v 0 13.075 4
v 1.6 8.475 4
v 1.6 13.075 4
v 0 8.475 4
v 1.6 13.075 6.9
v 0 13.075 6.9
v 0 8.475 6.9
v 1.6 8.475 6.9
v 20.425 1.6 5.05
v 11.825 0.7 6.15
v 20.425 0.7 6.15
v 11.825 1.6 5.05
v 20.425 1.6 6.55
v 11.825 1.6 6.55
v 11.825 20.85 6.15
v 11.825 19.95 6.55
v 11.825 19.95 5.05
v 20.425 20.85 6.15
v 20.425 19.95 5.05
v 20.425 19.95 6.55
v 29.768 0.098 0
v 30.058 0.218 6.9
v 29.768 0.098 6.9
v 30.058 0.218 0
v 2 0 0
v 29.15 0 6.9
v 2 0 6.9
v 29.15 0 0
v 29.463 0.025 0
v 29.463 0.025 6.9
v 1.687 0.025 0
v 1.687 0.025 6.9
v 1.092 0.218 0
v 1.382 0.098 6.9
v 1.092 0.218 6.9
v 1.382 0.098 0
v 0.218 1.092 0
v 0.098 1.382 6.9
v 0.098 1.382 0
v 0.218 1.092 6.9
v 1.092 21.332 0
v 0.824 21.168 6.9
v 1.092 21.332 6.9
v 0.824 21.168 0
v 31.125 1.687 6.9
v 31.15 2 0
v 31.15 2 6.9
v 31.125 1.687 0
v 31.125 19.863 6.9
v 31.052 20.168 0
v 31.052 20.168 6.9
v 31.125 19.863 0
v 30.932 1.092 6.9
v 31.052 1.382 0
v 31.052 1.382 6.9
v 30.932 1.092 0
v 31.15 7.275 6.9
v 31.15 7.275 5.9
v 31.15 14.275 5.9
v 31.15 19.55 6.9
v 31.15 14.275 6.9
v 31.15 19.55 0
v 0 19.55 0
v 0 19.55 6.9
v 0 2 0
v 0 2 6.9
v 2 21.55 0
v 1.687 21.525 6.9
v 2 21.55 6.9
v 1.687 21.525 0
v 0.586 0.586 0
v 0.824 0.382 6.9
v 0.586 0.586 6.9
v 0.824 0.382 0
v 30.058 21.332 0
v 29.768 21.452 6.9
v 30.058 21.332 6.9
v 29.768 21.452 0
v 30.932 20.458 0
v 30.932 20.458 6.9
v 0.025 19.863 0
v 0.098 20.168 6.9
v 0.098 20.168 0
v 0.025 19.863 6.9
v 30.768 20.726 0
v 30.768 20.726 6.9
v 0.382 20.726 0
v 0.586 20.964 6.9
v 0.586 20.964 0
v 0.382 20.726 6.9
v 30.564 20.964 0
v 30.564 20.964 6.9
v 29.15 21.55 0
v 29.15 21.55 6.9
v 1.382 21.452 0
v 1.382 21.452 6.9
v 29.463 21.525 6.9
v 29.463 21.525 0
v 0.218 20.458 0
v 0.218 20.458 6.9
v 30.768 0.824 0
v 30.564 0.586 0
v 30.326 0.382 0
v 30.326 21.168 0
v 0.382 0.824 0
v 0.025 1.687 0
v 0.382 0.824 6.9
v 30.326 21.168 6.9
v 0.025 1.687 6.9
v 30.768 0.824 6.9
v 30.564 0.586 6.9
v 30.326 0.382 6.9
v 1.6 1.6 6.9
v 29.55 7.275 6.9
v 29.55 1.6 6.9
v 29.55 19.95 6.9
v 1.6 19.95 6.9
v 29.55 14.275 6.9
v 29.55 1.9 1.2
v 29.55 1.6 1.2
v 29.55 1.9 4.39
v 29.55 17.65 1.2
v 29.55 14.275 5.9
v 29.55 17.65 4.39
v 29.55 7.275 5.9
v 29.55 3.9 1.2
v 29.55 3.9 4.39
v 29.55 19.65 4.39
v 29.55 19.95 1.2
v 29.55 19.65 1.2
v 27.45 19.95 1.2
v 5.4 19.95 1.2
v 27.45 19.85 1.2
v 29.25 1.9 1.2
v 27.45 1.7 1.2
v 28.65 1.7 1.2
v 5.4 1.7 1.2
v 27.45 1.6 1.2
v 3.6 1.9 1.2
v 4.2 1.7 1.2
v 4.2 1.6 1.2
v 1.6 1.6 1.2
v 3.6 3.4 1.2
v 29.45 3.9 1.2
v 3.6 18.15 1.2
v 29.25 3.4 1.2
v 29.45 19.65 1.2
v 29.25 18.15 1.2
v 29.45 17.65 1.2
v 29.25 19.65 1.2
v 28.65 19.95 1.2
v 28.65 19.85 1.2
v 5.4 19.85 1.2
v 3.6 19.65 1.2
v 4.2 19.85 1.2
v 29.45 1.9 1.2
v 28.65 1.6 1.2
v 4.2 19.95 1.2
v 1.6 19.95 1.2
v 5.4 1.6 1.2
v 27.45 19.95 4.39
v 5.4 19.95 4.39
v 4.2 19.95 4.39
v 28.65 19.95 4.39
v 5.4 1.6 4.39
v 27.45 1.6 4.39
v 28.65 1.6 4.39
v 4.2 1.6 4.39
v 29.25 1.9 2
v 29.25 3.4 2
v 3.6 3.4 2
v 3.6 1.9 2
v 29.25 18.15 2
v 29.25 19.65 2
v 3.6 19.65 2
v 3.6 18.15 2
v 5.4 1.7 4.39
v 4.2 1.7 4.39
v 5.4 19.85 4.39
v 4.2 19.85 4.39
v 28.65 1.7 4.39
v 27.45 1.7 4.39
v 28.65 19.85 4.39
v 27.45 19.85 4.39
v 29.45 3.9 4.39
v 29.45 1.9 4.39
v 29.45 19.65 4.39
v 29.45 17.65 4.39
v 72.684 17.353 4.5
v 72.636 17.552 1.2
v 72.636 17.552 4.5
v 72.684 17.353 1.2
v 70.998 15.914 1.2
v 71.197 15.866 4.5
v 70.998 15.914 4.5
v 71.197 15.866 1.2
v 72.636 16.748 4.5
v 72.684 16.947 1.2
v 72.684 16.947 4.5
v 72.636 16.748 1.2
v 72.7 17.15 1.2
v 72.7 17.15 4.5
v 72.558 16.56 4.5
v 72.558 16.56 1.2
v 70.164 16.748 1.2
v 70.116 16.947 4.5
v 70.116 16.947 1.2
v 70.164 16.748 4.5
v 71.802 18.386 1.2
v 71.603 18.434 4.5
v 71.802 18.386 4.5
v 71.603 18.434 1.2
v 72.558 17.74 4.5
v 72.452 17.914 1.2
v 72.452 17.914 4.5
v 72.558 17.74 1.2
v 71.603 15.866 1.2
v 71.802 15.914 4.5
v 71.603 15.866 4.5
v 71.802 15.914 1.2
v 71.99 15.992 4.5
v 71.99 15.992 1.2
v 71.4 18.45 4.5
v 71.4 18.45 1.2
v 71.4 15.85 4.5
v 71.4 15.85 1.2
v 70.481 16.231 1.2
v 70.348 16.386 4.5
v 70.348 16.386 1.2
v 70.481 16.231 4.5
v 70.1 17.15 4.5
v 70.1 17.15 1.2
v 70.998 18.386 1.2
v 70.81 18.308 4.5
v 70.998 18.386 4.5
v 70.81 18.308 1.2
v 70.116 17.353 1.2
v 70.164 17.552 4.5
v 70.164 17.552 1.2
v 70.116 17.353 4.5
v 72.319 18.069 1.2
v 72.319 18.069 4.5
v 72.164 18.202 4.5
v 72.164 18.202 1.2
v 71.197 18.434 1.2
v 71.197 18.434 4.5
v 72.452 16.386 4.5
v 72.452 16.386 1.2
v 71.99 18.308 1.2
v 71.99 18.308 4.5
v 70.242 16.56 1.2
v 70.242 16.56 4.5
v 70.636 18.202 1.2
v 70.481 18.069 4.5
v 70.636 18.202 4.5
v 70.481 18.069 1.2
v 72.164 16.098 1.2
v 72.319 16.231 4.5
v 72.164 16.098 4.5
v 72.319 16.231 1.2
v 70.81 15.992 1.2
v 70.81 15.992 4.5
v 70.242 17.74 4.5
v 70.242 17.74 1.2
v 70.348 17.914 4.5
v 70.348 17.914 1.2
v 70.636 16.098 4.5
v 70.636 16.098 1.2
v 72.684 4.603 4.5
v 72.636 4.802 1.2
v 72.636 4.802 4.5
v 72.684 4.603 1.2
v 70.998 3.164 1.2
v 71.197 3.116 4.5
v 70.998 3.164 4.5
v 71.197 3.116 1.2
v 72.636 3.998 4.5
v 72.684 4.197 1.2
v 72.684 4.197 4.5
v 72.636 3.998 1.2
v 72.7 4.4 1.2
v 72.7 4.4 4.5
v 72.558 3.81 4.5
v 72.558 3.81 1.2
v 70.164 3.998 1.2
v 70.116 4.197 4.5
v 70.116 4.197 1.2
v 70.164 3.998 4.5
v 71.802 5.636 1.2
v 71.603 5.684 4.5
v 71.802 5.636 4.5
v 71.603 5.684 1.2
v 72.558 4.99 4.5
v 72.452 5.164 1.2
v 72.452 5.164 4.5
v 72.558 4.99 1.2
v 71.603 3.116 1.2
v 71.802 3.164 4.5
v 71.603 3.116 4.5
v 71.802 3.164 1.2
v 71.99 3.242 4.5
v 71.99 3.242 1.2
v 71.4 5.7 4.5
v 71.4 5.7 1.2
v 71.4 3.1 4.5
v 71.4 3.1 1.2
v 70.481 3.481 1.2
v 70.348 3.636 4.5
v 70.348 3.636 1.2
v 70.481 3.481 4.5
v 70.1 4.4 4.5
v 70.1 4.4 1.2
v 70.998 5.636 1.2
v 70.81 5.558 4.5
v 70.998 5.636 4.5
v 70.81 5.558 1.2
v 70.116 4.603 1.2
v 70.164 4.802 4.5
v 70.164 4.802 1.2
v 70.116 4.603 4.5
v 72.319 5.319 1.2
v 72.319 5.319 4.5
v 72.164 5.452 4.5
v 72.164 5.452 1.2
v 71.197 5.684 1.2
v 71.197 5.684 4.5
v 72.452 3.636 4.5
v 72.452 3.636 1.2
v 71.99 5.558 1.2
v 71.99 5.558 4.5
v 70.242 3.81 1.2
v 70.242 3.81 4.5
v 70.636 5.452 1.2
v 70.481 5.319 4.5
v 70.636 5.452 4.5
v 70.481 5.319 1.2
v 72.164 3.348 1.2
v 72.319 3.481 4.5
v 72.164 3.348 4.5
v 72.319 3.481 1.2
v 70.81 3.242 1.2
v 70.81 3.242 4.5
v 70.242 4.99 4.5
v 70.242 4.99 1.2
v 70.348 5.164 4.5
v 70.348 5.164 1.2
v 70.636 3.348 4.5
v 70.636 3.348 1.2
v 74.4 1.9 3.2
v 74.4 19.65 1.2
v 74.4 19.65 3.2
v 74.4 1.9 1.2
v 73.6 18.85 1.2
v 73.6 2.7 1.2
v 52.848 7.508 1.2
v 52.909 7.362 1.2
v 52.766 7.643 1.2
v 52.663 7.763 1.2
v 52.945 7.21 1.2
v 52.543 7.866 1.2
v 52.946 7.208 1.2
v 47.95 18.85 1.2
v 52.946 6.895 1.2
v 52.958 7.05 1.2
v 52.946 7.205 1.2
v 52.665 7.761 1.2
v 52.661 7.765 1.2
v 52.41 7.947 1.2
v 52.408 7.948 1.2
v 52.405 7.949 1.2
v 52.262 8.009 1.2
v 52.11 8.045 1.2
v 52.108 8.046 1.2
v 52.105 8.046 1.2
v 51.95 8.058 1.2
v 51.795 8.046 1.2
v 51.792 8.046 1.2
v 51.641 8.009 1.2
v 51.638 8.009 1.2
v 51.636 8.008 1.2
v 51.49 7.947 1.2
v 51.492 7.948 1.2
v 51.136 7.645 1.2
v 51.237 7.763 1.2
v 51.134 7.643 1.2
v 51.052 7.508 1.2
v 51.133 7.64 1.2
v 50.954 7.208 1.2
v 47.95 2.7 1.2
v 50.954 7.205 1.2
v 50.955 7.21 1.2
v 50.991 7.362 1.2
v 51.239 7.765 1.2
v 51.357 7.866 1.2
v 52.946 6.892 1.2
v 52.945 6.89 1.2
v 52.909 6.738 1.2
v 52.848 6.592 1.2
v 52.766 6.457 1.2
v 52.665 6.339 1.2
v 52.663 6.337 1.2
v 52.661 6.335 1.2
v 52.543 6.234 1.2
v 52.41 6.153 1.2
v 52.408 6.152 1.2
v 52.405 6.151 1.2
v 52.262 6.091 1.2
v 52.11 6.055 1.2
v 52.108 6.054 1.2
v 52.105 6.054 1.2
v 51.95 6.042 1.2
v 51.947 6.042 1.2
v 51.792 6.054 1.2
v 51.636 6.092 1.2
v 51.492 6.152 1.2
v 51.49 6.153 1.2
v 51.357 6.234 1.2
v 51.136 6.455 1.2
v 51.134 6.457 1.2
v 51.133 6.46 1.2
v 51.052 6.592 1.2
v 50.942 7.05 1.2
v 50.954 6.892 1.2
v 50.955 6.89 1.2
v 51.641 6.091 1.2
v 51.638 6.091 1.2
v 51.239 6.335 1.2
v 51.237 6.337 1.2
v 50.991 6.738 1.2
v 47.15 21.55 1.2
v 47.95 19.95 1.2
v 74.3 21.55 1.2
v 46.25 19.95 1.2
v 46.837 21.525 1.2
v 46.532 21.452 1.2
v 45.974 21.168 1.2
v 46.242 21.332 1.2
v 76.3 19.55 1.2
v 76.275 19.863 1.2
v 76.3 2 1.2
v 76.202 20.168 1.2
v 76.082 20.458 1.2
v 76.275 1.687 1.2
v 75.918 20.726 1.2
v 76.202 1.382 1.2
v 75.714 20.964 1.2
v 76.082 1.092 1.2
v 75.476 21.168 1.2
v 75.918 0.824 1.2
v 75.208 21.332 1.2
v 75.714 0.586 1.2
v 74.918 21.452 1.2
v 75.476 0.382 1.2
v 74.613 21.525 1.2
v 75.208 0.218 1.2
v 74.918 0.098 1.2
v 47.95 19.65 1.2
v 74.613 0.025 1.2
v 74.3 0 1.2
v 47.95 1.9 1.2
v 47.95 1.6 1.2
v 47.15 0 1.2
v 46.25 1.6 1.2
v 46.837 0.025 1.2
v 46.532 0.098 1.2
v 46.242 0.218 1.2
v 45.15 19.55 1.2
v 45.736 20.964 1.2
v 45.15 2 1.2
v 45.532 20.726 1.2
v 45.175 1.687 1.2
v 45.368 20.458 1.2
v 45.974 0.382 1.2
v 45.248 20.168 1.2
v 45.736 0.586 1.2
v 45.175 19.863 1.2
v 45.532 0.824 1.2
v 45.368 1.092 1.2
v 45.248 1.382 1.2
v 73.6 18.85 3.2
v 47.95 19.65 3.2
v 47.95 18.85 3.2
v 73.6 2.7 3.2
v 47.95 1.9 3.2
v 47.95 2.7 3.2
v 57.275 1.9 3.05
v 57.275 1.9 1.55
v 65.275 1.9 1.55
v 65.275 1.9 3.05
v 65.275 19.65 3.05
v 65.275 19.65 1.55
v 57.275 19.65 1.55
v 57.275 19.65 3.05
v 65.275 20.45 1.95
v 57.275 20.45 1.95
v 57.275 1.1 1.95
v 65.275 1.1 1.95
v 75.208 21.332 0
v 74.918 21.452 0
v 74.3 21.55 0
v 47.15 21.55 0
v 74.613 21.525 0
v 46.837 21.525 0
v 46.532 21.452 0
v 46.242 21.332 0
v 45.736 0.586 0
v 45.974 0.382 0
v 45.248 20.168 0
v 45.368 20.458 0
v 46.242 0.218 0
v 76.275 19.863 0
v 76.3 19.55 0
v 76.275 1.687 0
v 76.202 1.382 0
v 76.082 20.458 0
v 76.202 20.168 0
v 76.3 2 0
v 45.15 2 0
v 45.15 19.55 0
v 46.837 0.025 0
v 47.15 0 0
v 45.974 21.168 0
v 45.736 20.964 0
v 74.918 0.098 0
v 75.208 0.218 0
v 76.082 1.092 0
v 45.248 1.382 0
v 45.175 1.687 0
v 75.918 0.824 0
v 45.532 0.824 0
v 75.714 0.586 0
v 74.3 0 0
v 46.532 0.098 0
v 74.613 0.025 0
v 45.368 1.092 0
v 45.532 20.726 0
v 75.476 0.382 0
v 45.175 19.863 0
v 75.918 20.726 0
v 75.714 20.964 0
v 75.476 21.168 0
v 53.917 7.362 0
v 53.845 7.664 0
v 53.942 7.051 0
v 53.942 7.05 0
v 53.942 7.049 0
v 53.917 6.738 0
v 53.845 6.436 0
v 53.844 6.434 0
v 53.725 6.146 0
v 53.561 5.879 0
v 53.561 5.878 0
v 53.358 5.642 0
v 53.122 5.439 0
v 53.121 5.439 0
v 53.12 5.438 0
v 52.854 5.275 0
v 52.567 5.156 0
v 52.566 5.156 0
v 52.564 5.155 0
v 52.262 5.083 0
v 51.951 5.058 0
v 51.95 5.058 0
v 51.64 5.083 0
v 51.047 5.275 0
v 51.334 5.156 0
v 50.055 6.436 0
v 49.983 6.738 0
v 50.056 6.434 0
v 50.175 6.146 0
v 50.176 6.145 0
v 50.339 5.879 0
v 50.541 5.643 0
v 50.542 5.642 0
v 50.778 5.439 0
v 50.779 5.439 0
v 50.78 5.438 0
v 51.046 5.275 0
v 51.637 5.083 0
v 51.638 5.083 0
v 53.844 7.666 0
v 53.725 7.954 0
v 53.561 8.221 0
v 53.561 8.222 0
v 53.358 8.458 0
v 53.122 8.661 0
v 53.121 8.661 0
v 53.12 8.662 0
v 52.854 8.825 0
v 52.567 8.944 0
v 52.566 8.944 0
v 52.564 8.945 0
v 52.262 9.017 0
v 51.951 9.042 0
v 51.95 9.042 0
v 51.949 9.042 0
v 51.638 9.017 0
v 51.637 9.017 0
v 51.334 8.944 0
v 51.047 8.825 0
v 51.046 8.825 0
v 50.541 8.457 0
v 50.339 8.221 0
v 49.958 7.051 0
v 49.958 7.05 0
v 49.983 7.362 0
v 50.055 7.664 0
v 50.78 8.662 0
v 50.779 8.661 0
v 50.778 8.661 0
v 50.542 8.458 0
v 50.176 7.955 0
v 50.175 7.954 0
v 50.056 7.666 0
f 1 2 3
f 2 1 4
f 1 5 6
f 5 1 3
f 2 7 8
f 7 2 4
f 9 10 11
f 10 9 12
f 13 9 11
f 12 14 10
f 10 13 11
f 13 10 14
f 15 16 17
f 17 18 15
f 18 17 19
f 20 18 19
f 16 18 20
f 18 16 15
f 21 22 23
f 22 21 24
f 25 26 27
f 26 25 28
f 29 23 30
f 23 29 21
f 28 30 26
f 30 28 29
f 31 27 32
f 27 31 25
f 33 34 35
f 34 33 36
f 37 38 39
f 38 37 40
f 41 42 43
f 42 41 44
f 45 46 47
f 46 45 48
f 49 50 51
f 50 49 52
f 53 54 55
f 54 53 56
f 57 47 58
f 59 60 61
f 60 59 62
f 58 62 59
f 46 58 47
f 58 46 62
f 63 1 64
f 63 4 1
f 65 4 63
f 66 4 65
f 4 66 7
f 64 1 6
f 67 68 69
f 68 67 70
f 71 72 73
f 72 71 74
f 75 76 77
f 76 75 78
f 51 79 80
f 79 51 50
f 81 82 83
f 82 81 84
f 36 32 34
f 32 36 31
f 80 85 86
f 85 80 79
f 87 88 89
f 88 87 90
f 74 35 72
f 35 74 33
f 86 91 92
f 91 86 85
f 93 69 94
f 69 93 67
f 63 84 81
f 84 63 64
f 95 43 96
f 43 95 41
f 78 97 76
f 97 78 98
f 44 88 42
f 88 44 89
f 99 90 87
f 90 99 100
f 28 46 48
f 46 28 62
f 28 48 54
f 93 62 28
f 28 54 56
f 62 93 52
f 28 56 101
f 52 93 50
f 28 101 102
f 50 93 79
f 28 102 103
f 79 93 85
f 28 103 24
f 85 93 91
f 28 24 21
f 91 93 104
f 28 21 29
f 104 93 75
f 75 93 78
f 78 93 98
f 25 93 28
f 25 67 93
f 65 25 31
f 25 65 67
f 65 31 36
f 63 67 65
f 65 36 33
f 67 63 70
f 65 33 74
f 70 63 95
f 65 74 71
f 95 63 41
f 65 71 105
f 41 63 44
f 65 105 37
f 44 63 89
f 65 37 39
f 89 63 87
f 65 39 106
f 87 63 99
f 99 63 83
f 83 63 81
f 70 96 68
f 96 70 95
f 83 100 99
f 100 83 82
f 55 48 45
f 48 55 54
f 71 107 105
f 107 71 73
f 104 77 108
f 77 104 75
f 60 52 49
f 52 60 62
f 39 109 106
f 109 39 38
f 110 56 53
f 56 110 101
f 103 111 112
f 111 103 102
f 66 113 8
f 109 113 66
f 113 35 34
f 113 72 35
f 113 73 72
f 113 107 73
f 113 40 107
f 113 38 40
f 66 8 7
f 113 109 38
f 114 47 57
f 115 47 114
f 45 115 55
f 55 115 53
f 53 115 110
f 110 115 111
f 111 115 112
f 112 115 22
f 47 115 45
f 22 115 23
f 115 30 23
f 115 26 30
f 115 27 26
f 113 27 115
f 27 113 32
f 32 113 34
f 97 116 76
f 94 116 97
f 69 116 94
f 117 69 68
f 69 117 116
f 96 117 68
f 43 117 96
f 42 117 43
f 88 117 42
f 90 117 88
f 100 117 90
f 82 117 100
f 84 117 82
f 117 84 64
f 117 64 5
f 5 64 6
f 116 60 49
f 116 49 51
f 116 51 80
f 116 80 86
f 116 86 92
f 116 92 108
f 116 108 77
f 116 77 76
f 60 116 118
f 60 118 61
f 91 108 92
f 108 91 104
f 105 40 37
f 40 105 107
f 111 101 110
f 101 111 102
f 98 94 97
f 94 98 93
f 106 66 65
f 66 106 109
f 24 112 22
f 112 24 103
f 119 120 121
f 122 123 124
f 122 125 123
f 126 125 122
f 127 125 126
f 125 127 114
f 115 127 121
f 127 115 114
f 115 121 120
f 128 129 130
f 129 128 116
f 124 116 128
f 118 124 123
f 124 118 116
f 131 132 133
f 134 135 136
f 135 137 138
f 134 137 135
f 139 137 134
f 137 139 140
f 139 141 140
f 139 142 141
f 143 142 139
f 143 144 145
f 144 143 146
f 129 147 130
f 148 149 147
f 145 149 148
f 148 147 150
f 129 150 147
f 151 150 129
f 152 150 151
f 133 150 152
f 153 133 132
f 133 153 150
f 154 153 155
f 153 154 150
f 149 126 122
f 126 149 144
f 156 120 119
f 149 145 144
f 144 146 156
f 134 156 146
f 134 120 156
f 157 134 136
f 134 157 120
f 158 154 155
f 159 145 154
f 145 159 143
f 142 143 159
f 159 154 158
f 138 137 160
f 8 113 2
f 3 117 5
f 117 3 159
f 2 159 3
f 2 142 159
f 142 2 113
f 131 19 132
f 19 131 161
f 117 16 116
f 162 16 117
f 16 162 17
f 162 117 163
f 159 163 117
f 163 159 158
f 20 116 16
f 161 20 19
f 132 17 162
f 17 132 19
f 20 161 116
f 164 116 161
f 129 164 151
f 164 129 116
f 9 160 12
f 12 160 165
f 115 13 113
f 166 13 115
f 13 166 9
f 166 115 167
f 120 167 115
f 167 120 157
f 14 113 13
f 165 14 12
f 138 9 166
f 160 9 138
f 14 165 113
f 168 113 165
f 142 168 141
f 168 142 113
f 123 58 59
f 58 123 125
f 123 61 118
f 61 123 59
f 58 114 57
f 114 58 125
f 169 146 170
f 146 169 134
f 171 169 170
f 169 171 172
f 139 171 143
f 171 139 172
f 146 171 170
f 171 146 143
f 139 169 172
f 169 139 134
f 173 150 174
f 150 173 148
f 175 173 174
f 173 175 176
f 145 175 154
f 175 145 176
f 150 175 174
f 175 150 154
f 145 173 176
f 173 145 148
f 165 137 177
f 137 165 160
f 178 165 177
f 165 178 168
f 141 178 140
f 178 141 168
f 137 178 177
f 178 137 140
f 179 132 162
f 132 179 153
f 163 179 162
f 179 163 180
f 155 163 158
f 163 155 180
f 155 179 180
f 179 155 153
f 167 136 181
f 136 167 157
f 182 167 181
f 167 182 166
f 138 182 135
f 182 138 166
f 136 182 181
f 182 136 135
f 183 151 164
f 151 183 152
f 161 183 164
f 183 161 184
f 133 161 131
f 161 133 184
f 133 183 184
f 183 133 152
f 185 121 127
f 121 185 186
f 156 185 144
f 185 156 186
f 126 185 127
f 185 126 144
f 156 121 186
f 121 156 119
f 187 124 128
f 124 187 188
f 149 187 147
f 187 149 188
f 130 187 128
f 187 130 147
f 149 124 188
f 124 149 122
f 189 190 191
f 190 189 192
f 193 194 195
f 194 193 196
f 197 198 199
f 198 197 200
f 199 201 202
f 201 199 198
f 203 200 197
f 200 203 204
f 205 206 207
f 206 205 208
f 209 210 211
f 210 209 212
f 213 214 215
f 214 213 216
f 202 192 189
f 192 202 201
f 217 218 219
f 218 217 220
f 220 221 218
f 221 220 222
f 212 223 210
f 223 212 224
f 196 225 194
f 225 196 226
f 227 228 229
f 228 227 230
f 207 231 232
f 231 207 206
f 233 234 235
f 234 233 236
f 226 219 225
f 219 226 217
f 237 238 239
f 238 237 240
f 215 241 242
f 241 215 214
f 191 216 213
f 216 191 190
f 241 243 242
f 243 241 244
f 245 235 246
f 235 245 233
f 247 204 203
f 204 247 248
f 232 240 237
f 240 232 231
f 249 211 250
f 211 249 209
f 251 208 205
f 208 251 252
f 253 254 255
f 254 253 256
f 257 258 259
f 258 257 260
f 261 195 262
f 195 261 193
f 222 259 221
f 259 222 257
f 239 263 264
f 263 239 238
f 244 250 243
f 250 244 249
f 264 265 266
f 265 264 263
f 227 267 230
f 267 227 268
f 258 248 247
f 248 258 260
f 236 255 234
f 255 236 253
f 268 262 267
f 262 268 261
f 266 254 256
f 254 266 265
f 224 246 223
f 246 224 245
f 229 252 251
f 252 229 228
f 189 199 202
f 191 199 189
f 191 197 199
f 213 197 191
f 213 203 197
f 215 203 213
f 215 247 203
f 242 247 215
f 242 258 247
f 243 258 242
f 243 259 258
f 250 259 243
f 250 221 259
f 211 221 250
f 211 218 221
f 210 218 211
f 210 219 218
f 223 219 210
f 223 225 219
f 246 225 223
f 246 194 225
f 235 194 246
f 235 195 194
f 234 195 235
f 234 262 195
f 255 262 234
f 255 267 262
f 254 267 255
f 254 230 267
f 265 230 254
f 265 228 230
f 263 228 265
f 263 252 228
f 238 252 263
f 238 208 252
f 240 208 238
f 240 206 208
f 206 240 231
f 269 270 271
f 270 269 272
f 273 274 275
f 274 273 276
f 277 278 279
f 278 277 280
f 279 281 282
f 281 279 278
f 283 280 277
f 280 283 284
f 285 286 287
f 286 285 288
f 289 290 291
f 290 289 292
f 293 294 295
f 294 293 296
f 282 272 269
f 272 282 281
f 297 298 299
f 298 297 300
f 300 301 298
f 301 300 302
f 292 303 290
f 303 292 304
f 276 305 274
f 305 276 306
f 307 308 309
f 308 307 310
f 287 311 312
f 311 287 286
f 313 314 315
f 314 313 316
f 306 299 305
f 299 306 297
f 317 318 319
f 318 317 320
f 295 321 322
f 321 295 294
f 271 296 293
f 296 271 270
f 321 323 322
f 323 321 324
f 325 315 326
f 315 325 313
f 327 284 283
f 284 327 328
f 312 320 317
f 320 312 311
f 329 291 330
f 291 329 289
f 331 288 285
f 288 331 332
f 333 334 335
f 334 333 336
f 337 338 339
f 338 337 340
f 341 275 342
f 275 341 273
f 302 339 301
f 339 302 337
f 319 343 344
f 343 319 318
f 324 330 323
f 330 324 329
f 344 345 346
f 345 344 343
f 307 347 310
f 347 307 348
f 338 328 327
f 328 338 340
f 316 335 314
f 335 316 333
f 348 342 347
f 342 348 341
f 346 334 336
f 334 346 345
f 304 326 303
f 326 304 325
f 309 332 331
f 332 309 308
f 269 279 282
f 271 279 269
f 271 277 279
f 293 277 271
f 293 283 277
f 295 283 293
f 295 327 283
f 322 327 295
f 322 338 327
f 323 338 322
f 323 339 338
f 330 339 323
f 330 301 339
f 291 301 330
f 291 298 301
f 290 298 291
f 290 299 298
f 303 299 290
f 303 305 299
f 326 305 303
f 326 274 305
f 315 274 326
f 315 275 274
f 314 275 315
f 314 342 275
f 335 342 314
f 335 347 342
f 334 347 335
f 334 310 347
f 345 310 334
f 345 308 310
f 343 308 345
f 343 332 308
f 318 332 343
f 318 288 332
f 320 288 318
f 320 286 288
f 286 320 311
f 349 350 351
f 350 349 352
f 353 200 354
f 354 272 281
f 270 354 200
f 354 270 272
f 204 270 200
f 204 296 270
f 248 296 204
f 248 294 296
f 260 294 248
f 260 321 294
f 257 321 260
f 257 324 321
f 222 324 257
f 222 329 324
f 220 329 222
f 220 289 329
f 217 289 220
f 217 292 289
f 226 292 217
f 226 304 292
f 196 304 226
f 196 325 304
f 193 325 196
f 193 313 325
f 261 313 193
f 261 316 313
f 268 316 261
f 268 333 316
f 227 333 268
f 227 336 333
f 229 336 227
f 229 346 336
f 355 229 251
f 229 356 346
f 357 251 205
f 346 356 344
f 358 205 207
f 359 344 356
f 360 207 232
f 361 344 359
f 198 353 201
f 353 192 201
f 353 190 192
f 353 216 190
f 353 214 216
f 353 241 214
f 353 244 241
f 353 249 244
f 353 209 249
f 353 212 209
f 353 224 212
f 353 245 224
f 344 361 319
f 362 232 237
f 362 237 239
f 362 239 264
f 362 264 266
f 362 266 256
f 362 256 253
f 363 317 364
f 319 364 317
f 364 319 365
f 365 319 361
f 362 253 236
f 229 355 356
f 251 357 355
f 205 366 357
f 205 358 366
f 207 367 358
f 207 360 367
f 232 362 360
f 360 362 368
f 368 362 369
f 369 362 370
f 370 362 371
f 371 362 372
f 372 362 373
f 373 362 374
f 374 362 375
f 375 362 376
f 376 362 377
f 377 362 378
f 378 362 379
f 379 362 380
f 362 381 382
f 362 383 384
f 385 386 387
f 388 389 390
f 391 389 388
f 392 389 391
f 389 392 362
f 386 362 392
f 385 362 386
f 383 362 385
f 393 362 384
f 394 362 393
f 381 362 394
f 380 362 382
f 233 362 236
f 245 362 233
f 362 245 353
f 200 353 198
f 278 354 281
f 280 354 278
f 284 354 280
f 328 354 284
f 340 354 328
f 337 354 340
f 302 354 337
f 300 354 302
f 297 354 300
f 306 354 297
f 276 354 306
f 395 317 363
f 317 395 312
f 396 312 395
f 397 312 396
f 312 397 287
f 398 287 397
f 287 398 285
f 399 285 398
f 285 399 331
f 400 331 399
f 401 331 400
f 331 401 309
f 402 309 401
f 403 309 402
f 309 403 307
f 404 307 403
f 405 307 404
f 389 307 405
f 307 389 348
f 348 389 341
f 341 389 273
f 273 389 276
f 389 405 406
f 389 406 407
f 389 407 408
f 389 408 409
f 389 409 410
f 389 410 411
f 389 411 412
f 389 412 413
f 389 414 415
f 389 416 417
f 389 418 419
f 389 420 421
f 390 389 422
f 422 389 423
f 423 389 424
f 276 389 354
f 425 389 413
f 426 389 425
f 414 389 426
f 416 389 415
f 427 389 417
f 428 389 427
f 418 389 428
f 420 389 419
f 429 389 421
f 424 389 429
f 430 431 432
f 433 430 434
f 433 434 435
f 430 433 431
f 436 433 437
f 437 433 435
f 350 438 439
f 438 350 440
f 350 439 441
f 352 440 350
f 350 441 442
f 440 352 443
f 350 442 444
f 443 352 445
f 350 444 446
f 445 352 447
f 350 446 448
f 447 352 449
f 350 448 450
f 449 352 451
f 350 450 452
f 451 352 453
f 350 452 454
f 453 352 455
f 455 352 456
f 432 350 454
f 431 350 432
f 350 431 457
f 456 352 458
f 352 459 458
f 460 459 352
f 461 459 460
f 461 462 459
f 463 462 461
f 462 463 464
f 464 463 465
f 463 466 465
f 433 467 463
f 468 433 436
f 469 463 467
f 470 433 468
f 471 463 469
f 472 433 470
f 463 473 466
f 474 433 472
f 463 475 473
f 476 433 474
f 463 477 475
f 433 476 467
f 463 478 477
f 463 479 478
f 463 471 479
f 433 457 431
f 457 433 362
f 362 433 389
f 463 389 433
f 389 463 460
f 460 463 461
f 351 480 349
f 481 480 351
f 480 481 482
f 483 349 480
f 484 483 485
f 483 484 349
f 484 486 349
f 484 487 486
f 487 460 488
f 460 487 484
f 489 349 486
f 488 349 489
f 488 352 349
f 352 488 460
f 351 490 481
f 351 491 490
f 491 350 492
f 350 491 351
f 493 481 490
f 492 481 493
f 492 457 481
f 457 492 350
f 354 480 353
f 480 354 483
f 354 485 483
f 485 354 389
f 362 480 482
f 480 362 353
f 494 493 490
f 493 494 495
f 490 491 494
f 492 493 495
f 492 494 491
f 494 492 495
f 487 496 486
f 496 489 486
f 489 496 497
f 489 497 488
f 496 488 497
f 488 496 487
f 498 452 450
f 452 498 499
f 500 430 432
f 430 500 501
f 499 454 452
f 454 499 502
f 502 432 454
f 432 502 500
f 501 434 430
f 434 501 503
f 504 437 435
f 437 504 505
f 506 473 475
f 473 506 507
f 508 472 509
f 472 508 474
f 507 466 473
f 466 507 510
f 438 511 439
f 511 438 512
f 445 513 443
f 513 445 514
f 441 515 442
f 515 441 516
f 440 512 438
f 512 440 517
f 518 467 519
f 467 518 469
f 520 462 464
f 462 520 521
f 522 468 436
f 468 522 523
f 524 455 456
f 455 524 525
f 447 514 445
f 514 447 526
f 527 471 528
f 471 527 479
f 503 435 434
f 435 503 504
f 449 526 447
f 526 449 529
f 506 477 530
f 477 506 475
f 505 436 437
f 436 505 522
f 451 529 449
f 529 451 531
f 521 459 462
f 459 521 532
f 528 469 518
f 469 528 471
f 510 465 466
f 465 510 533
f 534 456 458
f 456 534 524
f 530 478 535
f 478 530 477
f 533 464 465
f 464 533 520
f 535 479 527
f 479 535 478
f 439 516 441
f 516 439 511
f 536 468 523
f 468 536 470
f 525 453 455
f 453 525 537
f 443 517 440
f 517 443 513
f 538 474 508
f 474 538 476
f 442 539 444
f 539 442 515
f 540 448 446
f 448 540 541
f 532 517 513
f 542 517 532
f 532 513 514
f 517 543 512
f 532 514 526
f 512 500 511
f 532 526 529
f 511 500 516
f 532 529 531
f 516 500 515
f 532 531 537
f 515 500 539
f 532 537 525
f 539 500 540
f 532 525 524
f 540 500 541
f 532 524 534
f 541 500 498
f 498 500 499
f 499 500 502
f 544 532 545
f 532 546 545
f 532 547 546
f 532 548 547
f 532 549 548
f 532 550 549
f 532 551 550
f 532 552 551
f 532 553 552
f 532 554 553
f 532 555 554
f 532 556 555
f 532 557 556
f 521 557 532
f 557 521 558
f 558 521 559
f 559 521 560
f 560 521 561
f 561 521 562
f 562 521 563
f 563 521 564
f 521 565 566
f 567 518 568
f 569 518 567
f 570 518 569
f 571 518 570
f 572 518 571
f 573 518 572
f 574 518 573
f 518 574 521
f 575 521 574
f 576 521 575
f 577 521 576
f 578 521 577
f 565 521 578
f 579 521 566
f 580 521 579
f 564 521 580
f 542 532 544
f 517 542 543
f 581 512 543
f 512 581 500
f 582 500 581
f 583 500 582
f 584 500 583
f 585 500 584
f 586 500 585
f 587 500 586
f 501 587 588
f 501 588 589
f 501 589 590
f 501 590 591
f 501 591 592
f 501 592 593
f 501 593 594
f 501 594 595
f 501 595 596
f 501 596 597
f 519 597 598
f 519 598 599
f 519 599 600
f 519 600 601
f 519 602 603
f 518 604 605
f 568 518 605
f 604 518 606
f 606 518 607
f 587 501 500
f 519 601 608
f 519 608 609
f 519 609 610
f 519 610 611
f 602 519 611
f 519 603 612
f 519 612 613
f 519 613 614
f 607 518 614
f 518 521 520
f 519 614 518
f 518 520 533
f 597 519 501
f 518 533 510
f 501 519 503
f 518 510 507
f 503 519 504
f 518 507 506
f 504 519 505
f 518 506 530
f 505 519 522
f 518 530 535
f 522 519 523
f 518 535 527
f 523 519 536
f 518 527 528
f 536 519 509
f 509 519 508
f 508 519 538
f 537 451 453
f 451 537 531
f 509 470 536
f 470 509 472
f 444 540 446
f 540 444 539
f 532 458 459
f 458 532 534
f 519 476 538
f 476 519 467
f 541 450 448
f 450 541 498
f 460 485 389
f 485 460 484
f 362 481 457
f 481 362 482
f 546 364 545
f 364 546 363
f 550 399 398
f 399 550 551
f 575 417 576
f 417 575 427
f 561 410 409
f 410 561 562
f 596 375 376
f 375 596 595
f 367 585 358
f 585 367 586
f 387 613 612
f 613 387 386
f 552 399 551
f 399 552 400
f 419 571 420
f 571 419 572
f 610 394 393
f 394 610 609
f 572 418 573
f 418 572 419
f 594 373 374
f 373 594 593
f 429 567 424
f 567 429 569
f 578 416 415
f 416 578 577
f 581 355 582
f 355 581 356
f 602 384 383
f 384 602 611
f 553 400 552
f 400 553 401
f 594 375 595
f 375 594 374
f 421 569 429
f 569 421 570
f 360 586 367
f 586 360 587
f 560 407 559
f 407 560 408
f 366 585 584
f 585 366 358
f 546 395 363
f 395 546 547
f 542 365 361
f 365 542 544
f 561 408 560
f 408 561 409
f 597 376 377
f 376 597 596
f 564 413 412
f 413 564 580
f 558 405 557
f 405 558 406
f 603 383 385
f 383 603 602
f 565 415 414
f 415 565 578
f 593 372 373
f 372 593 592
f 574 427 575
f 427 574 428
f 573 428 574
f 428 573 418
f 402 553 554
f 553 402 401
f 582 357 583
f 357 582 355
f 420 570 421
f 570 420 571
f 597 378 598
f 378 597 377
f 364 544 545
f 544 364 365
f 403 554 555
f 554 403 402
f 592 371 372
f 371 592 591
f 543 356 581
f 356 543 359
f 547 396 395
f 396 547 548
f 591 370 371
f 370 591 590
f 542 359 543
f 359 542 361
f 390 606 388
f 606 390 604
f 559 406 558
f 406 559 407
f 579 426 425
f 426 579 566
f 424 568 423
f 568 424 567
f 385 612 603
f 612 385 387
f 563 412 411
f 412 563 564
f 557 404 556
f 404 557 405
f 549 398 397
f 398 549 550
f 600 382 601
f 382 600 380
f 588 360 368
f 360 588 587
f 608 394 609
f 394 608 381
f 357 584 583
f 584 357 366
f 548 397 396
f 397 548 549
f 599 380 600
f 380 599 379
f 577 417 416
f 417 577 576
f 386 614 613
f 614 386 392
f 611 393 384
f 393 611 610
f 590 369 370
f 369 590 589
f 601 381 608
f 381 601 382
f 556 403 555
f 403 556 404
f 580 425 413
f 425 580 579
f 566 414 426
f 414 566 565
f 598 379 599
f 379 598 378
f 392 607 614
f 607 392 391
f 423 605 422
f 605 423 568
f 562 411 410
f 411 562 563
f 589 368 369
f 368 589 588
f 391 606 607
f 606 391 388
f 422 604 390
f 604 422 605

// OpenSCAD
// 4438 IMU case. v3 (2026-11-14): the 4438 moves to the BACK OF THE HAND, held by a self-adhesive velcro patch on the
// flat base (mount = "velcro": no lugs, no flange); the XIAO case takes the forearm watch band. Cable end toward the wrist.
// Before: forearm IMU case on the glove's velcro strap. Draft 2026-11-02: outline, connector
// positions (centred on both short edges, flush with the edge) and LED read from reference photos on a ruler; component
// height (top_h) and PCB thickness are not measured yet, so check the first print.
// Two printed parts: the body (snug pocket with corner locators, open-top notch for the STEMMA QT plug + cable at one end,
// strain-relief pins, sewing flange with needle holes) and the lid (snap latch like the hand case, posts that press the
// board flat, an engraved arrow so the board always goes on the same way round).
// FDM, 0.4 mm nozzle, PLA or PETG, 0.2 mm layers, no supports (body open side up, lid flat side down).
//   part = "body" | "lid" | "snaptest" | "all" | "assembly"
part = "all";

// ---- board (MEASURE) ----
pcb     = [25.65, 17.75, 1.6]; // 25.63 x 17.73 mm measured 2026-11-02 (length = connector face to connector face; first reading 25.18, photo estimate 25.4 x 17.8)
                               // (2026-11-02), scaled by the 2.54 mm header pitch (9 holes = 20.32 mm); thickness not measured
under   = 0.8;                 // room under the board (header holes are unused; solder blobs, if any)
top_h   = 3.0;                 // tallest part on top: the STEMMA QT (JST SH) receptacles
plug    = [6.4, 3.8];          // STEMMA QT plug: width and height where it passes the end wall
plug_z  = 0.0;                 // plug bottom above the PCB top (side-entry receptacle: about level with the PCB top)
cable_d = 4.6;                 // cable exit notch width: the 4 STEMMA QT wires leave the plug side by side (~4 mm flat)
led     = [3.2, 12.6];         // power LED ("on", next to the cable-side connector) [mm from the cable end, mm from the left edge],
                               // from the photo, +-0.5 mm. Board lies in the case turned 180 deg from the photo (cable end at x = 0),
                               // so the silkscreen X arrow points along the lid arrow (+x, away from the cable)
led_hole = true;               // cone window over the power LED (2 -> 4 mm); position in "led" is a guess until the photo
chain   = false;               // false (2026-11-02): one cable at the MAIN end, far end closed -> shortest case. true: both ends open
//chain = true;                // STEMMA QT at BOTH ends: cable in at one end, out to the next sensor at the other (daisy chain)
labels  = false;               // off (2026-11-02): one opening + cable toward the hand fix the direction; the LED hole checks the connector
//labels = true;                // engrave "MAIN" (cable from the XIAO) and "OUT" (chain) at the two ends of the lid
arrow_x = false;               // off, same reason
//arrow_x = true;                // engrave an arrow on the lid pointing away from the cable end (match it to the silkscreen axes)

// ---- case ----
clr     = 0.3;
wall    = 1.6;
floor_t = 1.2;
lid_t   = 1.2;
corner_r = 2.0;
pin_d   = 3.0;
pins_len = 1.7;                // room at the cable end for the STEMMA QT plug: it sticks out 1.17 mm past the board
                               // (26.80 mm board + plug vs 25.63 board, 2026-11-02) + 0.5 mm
strain_pins = false;           // v1 draft had pins inside (9 mm per end); now a zip-tie tab outside each cable exit
loc     = [0.8, 0.2];          // corner locators: thickness, gap to the board
mount   = "velcro";            // v3: flat base for a velcro patch, on the back of the hand (2026-11-14)
//mount = "springbar";         // "springbar": watch lugs with spring-bar holes (2026-11-02, 22 mm quick-release band);
                               // "strap": fixed printed bars for NATO / single-pass straps; "flange": sewing flange
//mount = "strap";             // "strap": watch-strap bars on both long sides; "flange": sewing flange with needle holes
strap_w = 22.0;                // watch strap width (20 mm is the commonest; NATO or single-pass velcro)
strap_gap = 3.2;               // room for the strap between bar and case wall (NATO passes twice, ~1.3 mm per layer)
bar     = [3.0, 3.0];          // printed bar cross-section (out from the wall, height); prints flat on the bed
ear_t   = 2.0;                 // lug ear thickness along x
tie_tab = false;               // zip-tie tab outside the cable exit; off (2026-11-02): flush ends, cable held by the notch + lid
tie     = [1.6, 3.2];          // zip-tie slot in the tab outside each cable exit
flange  = 5.0;
hole_d  = 1.4;
snap    = true;
snap_d  = 0.8;                 // same as the hand case v2.2 (0.6 came loose after a few days); tune both from the snap tests
snap_l  = 8.0;                 // v2.2: was 6
nail    = [7.0, 1.0];

$fn = 40;
// Layout along x: cable end at x = 0 (pins area first, then the board); the far end wall is closed.
inner   = [pins_len * (chain ? 2 : 1) + pcb[0] + 2 * clr, pcb[1] + 2 * clr];
outer   = [inner[0] + 2 * wall, inner[1] + 2 * wall];
pcb_x   = wall + pins_len + clr;
pcb_y   = wall + clr;
z_pcb_bot = floor_t + under;
z_pcb_top = z_pcb_bot + pcb[2];
h_body  = z_pcb_top + top_h + clr;
snap_x  = pins_len + pcb[0] / 2;                     // bumps centred on the board's long sides
plug_y  = pcb_y + pcb[1] / 2;                        // receptacle centred on the short edge (check)

module rbox(s, h, r) { linear_extrude(h) offset(r) offset(-r) square(s); }

module snap_profile(side, d, len, top_z, is_groove) {
  y0 = side == 0 ? wall + clr : wall + inner[1] - clr;
  yw = side == 0 ? wall : wall + inner[1];
  yy = is_groove ? yw : y0;
  dir = side == 0 ? -1 : 1;
  z1 = top_z - 1.85; z2 = top_z - 0.75; z3 = top_z - 0.35;   // v2.2: peak raised, so the retaining face is ~63 deg (was ~40) and the entry ramp stays gentle
  translate([wall + snap_x - len / 2, yy, 0]) rotate([90, 0, 90]) linear_extrude(len)
    polygon(concat([[0, z1], [dir * d, z2], [0, z3]], is_groove ? [[-dir * 0.05, z3], [-dir * 0.05, z1]] : [[-dir * 0.3, z3], [-dir * 0.3, z1]]));
}

// cable exit through the end wall at x0 (outside face), open to the top; the lid closes it
module cable_notch(x0) {
  translate([x0 - 1, plug_y - cable_d / 2, z_pcb_top + plug_z + 0.4]) cube([wall + 2, cable_d, h_body]);
  translate([x0 - 1, plug_y, z_pcb_top + plug_z + 0.4 + cable_d / 2]) rotate([0, 90, 0]) cylinder(d = cable_d, h = wall + 2);
}
module strain_pins(x0, dir) {   // x0 = inside face of the end wall, dir = +1 going inward from x = 0, -1 from the far end
  for (i = [0:1]) translate([x0 + dir * (2.5 + i * 3.6), plug_y + (i == 0 ? -2.2 : 2.2), floor_t - 0.01]) cylinder(d = pin_d, h = h_body - floor_t - 0.4);
}

// Watch-strap lugs on both long sides: two ears and a fixed bar; the strap threads between the bar and the case wall.
// Spring-bar lugs: two ears per long side, 1.1 mm through-holes for the bar tips (~0.8 mm), strap_w + 0.2 between ears.
// The strap pull runs along the print layers (ears grow up from the bed), the strong direction.
sb_ear  = [2.6, 4.6, 5.0];     // ear: thickness along x, reach out from the wall, height (4.6: shortened 2026-11-02 for swing feel)
sb_hole = 1.1;                 // through-hole for the spring-bar tip; open with a 1 mm drill if it prints small
sb_out  = 2.6;                 // hole centre out from the case wall (room for the strap's end piece to turn)
sb_z    = 2.6;                 // hole centre height above the bed
module springbar_lugs() {
  xc = outer[0] / 2;
  gap = strap_w + 0.2;
  for (side = [0, 1]) {
    ys = side == 0 ? -sb_ear[1] : outer[1];
    yh = side == 0 ? -sb_out : outer[1] + sb_out;
    difference() {
      for (sx = [-1, 1]) translate([xc + sx * (gap / 2) + (sx < 0 ? -sb_ear[0] : 0), ys, 0])
        hull() {                                      // ear with a rounded outer end
          cube([sb_ear[0], 0.01 + (side == 0 ? sb_ear[1] - 1.5 : 1.5), sb_ear[2]]);
          translate([0, side == 0 ? 1.5 : sb_ear[1] - 1.5, 1.5]) rotate([0, 90, 0]) cylinder(r = 1.5, h = sb_ear[0]);
          translate([0, side == 0 ? 1.5 : sb_ear[1] - 1.5, sb_ear[2] - 1.5]) rotate([0, 90, 0]) cylinder(r = 1.5, h = sb_ear[0]);
          translate([0, side == 0 ? sb_ear[1] - 0.01 : 0, 0]) cube([sb_ear[0], 0.01, sb_ear[2]]);
        }
      translate([xc - gap / 2 - sb_ear[0] - 1, yh, sb_z]) rotate([0, 90, 0]) cylinder(d = sb_hole, h = gap + 2 * sb_ear[0] + 2, $fn = 24);
    }
  }
}

module strap_lugs() {
  xc = outer[0] / 2;
  reach = strap_gap + bar[0];
  ear_h = max(bar[1] + 1.0, 4.0);
  for (side = [0, 1]) {
    y0 = side == 0 ? -reach : outer[1];                       // outer edge of the lug zone
    for (sx = [-1, 1]) translate([xc + sx * (strap_w / 2 + 0.3) + (sx < 0 ? -ear_t : 0), y0, 0]) cube([ear_t, reach + 0.01, ear_h]);
    yb = side == 0 ? -reach : outer[1] + strap_gap;
    translate([xc - strap_w / 2 - 0.3 - ear_t, yb, 0]) cube([strap_w + 0.6 + 2 * ear_t, bar[0], bar[1]]);
  }
}
// Zip-tie tabs below each cable exit (the cable gets one tie here instead of weaving round pins inside)
module tie_tabs() {
  for (e = chain ? [0, 1] : [0]) {
    x0 = e == 0 ? -6 : outer[0];
    translate([x0, plug_y - 4, 0]) difference() {
      cube([6.01, 8, 1.6]);
      translate([(e == 0 ? 1.4 : 6 - 1.4 - tie[0]), 4 - tie[1] / 2, -1]) cube([tie[0], tie[1], 4]);
    }
  }
}

module body() {
  difference() {
    union() {
      rbox(outer, h_body, corner_r);
      if (mount == "flange") translate([-flange, -flange, 0]) rbox([outer[0] + 2 * flange, outer[1] + 2 * flange], 1.2, corner_r + flange);
    }
    translate([wall, wall, floor_t]) cube([inner[0], inner[1], h_body]);
    // cable exit: open-top notch in the cable-end wall, rounded bottom; the lid closes it
    cable_notch(0);
    if (chain) cable_notch(outer[0] - wall);
    if (snap) for (side = [0, 1]) snap_profile(side, snap_d + 0.1, snap_l + 0.6, h_body, true);
    translate([outer[0] - wall - 1, chain ? wall + 0.5 : outer[1] / 2 - nail[0] / 2, h_body - nail[1]]) cube([wall + 2, chain ? 4 : nail[0], nail[1] + 1]);
    if (mount == "flange") {
      for (x = [0, outer[0] / 2, outer[0]], y = [-flange / 2, outer[1] + flange / 2]) translate([x, y, -1]) cylinder(d = hole_d, h = 4);
      for (y = [outer[1] / 3, 2 * outer[1] / 3], x = [-flange / 2, outer[0] + flange / 2]) translate([x, y, -1]) cylinder(d = hole_d, h = 4);
    }
  }
  if (mount == "strap") { strap_lugs(); if (tie_tab) tie_tabs(); }
  if (mount == "springbar") { springbar_lugs(); if (tie_tab) tie_tabs(); }
  // board seat: two rails under the long edges (the middle stays clear)
  for (y = [pcb_y, pcb_y + pcb[1] - 1.5]) translate([pcb_x, y, floor_t - 0.01]) cube([pcb[0], 1.5, under + 0.01]);
  // corner locators at the four board corners
  lh = under + pcb[2] + 0.8;
  for (sx = [0, 1], sy = [0, 1]) {
    xx = sx == 0 ? pcb_x + 0.6 : pcb_x + pcb[0] - 1.8;
    yy = sy == 0 ? pcb_y - loc[1] - loc[0] : pcb_y + pcb[1] + loc[1];
    translate([xx, yy, floor_t - 0.01]) cube([1.2, loc[0], lh]);
  }
  // end stops (short, at the corners, clear of the receptacles in the middle of each short edge)
  for (xe = chain ? [pcb_x - loc[1] - loc[0], pcb_x + pcb[0] + loc[1]] : [pcb_x + pcb[0] + loc[1]], y = [pcb_y, pcb_y + pcb[1] - 2])
    translate([xe, y, floor_t - 0.01]) cube([loc[0], 2, lh]);
  // strain-relief pins between each cable exit and its plug: the cable weaves around them
  if (strain_pins) { strain_pins(wall, 1); if (chain) strain_pins(outer[0] - wall, -1); }
}

module lid() {
  difference() {
    union() {
      rbox(outer, lid_t, corner_r);
      // posts that press the board flat, near the two far corners (clear of the IMU chip in the middle)
      for (y = [pcb_y + 2.5, pcb_y + pcb[1] - 2.5]) translate([pcb_x + pcb[0] - 3.0, y, -(top_h + clr)]) cylinder(d = 2.6, h = top_h + clr + 0.01);
      // lip on the three closed sides
      translate([wall + clr, wall + clr, -2]) difference() {
        cube([inner[0] - 2 * clr, inner[1] - 2 * clr, 2]);
        translate([0.8, 0.8, -1]) cube([inner[0] - 2 * clr - 1.6, inner[1] - 2 * clr - 1.6, 4]);
      }
      if (snap) for (side = [0, 1]) snap_profile(side, snap_d, snap_l, 0, false);
    }
    translate([wall - 0.5, wall, -3]) cube([clr + 0.8 + 0.6, inner[1], 3]);   // no lip at the cable end(s)
    if (chain) translate([outer[0] - wall - clr - 0.8 - 0.1, wall, -3]) cube([clr + 0.8 + 0.6, inner[1], 3]);
    if (led_hole) translate([pcb_x + led[0], pcb_y + led[1], -0.01]) cylinder(d1 = 2.0, d2 = 4.0, h = lid_t + 0.02);
    // end labels, 0.4 mm deep, read across the lid: "MAIN" = the cable from the XIAO goes in here (connector next to the
    // board's "on" LED), "OUT" = the chained sensor
    if (labels) for (e = chain ? [[wall + pins_len / 2 + 1.5, "MAIN"], [outer[0] - wall - pins_len / 2 - 1.5, "OUT"]] : [[wall + 2.4, "MAIN"]])
      translate([e[0], chain ? outer[1] / 2 : wall + clr + 5.2, lid_t - 0.4]) rotate([0, 0, 90]) linear_extrude(1)   // single cable: beside the LED hole, not over it
        text(e[1], size = chain ? 3.0 : 2.6, font = "Liberation Sans:style=Bold", halign = "center", valign = "center");
    // arrow on the outside, 0.4 mm deep: points from the cable end toward the closed end
    if (arrow_x) translate([pcb_x + pcb[0] / 2 - 5, outer[1] / 2, lid_t - 0.4]) linear_extrude(1)
      polygon([[0, -0.8], [7, -0.8], [7, -2.4], [11, 0], [7, 2.4], [7, 0.8], [0, 0.8]]);
  }
}

if (part == "body") body();
else if (part == "lid") translate([0, 0, lid_t]) rotate([180, 0, 0]) translate([0, -outer[1], 0]) lid();
else if (part == "snaptest") {
  ring = 4;
  translate([0, 0, -(h_body - ring)]) intersection() { body(); translate([-20, -20, h_body - ring]) cube([200, 200, ring + 1]); }
  translate([outer[0] + 2 * flange + 4, outer[1], lid_t]) rotate([180, 0, 0]) lid();
}
else if (part == "all") { body(); translate([outer[0] + 2 * flange + 4, outer[1], lid_t]) rotate([180, 0, 0]) lid(); }
else if (part == "none") { }
else { body(); %translate([0, 0, h_body]) lid(); }

echo(str("forearm case outer ", outer[0], " x ", outer[1], " x ", h_body + lid_t, " mm (without the flange)"));
